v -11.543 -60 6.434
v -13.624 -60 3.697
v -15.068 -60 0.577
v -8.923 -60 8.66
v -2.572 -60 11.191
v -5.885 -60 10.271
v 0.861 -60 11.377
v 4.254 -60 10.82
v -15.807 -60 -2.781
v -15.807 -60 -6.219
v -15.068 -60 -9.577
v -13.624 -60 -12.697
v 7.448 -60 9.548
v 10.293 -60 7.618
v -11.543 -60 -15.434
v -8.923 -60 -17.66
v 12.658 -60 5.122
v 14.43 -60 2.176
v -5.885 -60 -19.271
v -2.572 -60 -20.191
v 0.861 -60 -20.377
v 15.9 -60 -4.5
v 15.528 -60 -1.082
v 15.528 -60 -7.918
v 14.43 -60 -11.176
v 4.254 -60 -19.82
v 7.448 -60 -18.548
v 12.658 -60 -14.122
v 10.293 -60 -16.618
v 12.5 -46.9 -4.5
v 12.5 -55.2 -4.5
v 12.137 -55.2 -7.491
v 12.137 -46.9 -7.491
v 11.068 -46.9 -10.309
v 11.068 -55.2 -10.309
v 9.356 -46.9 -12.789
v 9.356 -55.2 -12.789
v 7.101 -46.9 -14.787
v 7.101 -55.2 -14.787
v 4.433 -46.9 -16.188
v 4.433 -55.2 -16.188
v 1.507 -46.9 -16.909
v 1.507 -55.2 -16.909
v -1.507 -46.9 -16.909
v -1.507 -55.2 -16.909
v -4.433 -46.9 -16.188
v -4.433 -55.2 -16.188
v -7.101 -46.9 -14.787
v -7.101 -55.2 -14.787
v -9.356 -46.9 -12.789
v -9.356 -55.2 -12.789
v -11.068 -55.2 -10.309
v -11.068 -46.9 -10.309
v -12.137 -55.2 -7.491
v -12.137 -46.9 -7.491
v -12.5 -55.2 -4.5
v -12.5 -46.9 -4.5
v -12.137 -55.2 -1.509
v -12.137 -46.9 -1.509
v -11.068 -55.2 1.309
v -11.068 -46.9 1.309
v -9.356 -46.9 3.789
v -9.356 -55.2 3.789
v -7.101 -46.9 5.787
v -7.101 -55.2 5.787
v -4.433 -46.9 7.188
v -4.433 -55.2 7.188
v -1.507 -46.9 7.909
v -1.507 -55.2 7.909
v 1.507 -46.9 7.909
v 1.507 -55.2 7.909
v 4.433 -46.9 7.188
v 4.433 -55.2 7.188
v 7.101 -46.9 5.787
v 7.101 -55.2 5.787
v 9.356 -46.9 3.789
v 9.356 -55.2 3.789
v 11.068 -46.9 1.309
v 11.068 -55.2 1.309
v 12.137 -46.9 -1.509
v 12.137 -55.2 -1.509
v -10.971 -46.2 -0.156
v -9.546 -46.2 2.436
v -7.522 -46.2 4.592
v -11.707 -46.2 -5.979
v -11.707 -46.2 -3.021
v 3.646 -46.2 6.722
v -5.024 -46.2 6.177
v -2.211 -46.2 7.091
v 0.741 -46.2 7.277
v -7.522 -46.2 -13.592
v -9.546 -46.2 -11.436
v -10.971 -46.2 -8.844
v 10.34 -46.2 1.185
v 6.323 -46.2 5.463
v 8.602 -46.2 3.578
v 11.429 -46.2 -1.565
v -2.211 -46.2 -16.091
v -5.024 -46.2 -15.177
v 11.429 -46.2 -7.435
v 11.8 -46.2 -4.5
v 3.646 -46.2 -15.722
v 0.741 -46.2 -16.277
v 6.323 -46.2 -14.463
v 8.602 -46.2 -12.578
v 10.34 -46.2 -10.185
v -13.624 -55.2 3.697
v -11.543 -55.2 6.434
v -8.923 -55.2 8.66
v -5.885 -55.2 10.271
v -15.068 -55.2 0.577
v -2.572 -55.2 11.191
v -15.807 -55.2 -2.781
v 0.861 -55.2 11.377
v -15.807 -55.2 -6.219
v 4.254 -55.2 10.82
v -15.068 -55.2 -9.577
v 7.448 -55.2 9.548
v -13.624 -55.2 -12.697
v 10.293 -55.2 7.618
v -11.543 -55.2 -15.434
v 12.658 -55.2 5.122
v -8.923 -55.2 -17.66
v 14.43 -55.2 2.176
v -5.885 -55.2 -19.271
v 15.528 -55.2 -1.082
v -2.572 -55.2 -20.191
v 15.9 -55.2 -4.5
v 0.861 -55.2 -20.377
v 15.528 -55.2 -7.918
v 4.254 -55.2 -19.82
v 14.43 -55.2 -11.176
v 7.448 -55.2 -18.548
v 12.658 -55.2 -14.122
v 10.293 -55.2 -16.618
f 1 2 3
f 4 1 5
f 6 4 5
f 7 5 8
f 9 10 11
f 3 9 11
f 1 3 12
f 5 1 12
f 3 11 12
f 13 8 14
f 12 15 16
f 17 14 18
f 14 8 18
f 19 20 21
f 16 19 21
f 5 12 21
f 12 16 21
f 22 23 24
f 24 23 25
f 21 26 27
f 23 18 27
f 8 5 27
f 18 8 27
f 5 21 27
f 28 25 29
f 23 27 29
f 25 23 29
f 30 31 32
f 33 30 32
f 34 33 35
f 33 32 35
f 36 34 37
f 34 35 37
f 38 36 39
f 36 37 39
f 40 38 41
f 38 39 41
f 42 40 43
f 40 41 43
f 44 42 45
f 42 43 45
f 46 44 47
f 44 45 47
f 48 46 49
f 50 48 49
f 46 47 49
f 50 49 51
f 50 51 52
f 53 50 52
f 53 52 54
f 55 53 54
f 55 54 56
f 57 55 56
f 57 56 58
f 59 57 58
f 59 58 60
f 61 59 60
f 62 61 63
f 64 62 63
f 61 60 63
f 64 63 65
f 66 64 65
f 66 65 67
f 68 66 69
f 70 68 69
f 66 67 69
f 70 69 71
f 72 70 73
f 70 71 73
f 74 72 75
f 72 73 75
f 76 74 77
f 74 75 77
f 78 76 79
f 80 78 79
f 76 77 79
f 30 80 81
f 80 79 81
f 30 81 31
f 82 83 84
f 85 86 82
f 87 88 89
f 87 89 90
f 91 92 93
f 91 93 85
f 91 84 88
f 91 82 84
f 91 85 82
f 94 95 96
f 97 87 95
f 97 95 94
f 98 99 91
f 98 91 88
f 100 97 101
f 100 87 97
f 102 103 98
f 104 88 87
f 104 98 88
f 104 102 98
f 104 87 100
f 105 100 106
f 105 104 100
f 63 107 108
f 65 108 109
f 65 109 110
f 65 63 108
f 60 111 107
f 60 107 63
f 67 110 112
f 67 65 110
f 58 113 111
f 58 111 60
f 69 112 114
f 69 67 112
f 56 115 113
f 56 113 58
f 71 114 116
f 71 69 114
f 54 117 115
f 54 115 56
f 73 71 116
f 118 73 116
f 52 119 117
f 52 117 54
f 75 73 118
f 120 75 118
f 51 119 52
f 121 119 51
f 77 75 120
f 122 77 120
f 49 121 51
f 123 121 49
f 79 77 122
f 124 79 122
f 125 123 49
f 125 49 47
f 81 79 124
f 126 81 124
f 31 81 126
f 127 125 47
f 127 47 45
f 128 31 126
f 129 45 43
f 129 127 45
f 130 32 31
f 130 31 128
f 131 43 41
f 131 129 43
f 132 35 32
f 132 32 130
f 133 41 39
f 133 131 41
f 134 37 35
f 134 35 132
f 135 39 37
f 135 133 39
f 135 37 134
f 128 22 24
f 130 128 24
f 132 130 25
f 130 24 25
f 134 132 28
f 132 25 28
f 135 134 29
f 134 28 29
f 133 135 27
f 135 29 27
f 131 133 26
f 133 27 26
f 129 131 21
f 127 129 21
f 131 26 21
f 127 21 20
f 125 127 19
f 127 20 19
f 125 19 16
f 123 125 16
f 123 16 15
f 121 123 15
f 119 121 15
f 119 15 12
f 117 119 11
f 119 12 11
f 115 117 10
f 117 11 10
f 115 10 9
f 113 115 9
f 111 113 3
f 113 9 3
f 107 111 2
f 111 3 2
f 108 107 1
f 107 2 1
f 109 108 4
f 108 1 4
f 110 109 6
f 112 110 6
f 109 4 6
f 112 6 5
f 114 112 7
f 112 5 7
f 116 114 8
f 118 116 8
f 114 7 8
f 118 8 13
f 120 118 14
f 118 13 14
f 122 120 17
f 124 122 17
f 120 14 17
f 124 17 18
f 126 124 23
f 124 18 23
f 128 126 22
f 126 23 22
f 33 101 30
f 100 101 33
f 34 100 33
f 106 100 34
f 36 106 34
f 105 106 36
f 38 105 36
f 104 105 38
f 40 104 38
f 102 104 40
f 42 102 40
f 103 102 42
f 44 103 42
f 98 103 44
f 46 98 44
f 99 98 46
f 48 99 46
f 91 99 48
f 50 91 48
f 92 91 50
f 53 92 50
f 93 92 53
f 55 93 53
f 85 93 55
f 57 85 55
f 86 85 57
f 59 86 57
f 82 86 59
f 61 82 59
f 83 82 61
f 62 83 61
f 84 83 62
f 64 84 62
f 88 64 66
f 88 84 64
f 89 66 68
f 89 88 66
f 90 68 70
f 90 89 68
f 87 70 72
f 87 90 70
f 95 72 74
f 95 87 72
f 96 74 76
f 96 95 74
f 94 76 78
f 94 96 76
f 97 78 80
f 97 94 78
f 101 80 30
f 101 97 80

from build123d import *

# Parameters (mm, degrees)
SKETCH005_R             = 15.9
PAD003_DEPTH            = 4.8
SKETCH004_R             = 12.5
PAD002_DEPTH            = 9
CHAMFER002_SIZE         = 0.7
BODY001_PLACEMENT_ANGLE = 90


with BuildPart() as part:
    # Sketch005 → Pad003 (new body)
    with BuildSketch(Plane.XY):
        Circle(SKETCH005_R)
    extrude(amount=PAD003_DEPTH)

    # Sketch004 (on Face3 of Pad003) → Pad002 (join)
    with BuildSketch(Plane.XY.offset(4.8)):
        Circle(SKETCH004_R)
    extrude(amount=PAD002_DEPTH)

    # Chamfer002
    chamfer002_edges = [part.edges().sort_by_distance(p)[0] for p in [
        (-12.5, 0, 13.8),
    ]]
    chamfer(chamfer002_edges, length=CHAMFER002_SIZE)


with BuildPart() as part_1:
    # Body001 placement: moved
    add(part.part.moved(Location((0, -60, -4.5))).rotate(Axis((0, -60, -4.5), (-1, 0, 0)), BODY001_PLACEMENT_ANGLE))


solid = part_1.part
